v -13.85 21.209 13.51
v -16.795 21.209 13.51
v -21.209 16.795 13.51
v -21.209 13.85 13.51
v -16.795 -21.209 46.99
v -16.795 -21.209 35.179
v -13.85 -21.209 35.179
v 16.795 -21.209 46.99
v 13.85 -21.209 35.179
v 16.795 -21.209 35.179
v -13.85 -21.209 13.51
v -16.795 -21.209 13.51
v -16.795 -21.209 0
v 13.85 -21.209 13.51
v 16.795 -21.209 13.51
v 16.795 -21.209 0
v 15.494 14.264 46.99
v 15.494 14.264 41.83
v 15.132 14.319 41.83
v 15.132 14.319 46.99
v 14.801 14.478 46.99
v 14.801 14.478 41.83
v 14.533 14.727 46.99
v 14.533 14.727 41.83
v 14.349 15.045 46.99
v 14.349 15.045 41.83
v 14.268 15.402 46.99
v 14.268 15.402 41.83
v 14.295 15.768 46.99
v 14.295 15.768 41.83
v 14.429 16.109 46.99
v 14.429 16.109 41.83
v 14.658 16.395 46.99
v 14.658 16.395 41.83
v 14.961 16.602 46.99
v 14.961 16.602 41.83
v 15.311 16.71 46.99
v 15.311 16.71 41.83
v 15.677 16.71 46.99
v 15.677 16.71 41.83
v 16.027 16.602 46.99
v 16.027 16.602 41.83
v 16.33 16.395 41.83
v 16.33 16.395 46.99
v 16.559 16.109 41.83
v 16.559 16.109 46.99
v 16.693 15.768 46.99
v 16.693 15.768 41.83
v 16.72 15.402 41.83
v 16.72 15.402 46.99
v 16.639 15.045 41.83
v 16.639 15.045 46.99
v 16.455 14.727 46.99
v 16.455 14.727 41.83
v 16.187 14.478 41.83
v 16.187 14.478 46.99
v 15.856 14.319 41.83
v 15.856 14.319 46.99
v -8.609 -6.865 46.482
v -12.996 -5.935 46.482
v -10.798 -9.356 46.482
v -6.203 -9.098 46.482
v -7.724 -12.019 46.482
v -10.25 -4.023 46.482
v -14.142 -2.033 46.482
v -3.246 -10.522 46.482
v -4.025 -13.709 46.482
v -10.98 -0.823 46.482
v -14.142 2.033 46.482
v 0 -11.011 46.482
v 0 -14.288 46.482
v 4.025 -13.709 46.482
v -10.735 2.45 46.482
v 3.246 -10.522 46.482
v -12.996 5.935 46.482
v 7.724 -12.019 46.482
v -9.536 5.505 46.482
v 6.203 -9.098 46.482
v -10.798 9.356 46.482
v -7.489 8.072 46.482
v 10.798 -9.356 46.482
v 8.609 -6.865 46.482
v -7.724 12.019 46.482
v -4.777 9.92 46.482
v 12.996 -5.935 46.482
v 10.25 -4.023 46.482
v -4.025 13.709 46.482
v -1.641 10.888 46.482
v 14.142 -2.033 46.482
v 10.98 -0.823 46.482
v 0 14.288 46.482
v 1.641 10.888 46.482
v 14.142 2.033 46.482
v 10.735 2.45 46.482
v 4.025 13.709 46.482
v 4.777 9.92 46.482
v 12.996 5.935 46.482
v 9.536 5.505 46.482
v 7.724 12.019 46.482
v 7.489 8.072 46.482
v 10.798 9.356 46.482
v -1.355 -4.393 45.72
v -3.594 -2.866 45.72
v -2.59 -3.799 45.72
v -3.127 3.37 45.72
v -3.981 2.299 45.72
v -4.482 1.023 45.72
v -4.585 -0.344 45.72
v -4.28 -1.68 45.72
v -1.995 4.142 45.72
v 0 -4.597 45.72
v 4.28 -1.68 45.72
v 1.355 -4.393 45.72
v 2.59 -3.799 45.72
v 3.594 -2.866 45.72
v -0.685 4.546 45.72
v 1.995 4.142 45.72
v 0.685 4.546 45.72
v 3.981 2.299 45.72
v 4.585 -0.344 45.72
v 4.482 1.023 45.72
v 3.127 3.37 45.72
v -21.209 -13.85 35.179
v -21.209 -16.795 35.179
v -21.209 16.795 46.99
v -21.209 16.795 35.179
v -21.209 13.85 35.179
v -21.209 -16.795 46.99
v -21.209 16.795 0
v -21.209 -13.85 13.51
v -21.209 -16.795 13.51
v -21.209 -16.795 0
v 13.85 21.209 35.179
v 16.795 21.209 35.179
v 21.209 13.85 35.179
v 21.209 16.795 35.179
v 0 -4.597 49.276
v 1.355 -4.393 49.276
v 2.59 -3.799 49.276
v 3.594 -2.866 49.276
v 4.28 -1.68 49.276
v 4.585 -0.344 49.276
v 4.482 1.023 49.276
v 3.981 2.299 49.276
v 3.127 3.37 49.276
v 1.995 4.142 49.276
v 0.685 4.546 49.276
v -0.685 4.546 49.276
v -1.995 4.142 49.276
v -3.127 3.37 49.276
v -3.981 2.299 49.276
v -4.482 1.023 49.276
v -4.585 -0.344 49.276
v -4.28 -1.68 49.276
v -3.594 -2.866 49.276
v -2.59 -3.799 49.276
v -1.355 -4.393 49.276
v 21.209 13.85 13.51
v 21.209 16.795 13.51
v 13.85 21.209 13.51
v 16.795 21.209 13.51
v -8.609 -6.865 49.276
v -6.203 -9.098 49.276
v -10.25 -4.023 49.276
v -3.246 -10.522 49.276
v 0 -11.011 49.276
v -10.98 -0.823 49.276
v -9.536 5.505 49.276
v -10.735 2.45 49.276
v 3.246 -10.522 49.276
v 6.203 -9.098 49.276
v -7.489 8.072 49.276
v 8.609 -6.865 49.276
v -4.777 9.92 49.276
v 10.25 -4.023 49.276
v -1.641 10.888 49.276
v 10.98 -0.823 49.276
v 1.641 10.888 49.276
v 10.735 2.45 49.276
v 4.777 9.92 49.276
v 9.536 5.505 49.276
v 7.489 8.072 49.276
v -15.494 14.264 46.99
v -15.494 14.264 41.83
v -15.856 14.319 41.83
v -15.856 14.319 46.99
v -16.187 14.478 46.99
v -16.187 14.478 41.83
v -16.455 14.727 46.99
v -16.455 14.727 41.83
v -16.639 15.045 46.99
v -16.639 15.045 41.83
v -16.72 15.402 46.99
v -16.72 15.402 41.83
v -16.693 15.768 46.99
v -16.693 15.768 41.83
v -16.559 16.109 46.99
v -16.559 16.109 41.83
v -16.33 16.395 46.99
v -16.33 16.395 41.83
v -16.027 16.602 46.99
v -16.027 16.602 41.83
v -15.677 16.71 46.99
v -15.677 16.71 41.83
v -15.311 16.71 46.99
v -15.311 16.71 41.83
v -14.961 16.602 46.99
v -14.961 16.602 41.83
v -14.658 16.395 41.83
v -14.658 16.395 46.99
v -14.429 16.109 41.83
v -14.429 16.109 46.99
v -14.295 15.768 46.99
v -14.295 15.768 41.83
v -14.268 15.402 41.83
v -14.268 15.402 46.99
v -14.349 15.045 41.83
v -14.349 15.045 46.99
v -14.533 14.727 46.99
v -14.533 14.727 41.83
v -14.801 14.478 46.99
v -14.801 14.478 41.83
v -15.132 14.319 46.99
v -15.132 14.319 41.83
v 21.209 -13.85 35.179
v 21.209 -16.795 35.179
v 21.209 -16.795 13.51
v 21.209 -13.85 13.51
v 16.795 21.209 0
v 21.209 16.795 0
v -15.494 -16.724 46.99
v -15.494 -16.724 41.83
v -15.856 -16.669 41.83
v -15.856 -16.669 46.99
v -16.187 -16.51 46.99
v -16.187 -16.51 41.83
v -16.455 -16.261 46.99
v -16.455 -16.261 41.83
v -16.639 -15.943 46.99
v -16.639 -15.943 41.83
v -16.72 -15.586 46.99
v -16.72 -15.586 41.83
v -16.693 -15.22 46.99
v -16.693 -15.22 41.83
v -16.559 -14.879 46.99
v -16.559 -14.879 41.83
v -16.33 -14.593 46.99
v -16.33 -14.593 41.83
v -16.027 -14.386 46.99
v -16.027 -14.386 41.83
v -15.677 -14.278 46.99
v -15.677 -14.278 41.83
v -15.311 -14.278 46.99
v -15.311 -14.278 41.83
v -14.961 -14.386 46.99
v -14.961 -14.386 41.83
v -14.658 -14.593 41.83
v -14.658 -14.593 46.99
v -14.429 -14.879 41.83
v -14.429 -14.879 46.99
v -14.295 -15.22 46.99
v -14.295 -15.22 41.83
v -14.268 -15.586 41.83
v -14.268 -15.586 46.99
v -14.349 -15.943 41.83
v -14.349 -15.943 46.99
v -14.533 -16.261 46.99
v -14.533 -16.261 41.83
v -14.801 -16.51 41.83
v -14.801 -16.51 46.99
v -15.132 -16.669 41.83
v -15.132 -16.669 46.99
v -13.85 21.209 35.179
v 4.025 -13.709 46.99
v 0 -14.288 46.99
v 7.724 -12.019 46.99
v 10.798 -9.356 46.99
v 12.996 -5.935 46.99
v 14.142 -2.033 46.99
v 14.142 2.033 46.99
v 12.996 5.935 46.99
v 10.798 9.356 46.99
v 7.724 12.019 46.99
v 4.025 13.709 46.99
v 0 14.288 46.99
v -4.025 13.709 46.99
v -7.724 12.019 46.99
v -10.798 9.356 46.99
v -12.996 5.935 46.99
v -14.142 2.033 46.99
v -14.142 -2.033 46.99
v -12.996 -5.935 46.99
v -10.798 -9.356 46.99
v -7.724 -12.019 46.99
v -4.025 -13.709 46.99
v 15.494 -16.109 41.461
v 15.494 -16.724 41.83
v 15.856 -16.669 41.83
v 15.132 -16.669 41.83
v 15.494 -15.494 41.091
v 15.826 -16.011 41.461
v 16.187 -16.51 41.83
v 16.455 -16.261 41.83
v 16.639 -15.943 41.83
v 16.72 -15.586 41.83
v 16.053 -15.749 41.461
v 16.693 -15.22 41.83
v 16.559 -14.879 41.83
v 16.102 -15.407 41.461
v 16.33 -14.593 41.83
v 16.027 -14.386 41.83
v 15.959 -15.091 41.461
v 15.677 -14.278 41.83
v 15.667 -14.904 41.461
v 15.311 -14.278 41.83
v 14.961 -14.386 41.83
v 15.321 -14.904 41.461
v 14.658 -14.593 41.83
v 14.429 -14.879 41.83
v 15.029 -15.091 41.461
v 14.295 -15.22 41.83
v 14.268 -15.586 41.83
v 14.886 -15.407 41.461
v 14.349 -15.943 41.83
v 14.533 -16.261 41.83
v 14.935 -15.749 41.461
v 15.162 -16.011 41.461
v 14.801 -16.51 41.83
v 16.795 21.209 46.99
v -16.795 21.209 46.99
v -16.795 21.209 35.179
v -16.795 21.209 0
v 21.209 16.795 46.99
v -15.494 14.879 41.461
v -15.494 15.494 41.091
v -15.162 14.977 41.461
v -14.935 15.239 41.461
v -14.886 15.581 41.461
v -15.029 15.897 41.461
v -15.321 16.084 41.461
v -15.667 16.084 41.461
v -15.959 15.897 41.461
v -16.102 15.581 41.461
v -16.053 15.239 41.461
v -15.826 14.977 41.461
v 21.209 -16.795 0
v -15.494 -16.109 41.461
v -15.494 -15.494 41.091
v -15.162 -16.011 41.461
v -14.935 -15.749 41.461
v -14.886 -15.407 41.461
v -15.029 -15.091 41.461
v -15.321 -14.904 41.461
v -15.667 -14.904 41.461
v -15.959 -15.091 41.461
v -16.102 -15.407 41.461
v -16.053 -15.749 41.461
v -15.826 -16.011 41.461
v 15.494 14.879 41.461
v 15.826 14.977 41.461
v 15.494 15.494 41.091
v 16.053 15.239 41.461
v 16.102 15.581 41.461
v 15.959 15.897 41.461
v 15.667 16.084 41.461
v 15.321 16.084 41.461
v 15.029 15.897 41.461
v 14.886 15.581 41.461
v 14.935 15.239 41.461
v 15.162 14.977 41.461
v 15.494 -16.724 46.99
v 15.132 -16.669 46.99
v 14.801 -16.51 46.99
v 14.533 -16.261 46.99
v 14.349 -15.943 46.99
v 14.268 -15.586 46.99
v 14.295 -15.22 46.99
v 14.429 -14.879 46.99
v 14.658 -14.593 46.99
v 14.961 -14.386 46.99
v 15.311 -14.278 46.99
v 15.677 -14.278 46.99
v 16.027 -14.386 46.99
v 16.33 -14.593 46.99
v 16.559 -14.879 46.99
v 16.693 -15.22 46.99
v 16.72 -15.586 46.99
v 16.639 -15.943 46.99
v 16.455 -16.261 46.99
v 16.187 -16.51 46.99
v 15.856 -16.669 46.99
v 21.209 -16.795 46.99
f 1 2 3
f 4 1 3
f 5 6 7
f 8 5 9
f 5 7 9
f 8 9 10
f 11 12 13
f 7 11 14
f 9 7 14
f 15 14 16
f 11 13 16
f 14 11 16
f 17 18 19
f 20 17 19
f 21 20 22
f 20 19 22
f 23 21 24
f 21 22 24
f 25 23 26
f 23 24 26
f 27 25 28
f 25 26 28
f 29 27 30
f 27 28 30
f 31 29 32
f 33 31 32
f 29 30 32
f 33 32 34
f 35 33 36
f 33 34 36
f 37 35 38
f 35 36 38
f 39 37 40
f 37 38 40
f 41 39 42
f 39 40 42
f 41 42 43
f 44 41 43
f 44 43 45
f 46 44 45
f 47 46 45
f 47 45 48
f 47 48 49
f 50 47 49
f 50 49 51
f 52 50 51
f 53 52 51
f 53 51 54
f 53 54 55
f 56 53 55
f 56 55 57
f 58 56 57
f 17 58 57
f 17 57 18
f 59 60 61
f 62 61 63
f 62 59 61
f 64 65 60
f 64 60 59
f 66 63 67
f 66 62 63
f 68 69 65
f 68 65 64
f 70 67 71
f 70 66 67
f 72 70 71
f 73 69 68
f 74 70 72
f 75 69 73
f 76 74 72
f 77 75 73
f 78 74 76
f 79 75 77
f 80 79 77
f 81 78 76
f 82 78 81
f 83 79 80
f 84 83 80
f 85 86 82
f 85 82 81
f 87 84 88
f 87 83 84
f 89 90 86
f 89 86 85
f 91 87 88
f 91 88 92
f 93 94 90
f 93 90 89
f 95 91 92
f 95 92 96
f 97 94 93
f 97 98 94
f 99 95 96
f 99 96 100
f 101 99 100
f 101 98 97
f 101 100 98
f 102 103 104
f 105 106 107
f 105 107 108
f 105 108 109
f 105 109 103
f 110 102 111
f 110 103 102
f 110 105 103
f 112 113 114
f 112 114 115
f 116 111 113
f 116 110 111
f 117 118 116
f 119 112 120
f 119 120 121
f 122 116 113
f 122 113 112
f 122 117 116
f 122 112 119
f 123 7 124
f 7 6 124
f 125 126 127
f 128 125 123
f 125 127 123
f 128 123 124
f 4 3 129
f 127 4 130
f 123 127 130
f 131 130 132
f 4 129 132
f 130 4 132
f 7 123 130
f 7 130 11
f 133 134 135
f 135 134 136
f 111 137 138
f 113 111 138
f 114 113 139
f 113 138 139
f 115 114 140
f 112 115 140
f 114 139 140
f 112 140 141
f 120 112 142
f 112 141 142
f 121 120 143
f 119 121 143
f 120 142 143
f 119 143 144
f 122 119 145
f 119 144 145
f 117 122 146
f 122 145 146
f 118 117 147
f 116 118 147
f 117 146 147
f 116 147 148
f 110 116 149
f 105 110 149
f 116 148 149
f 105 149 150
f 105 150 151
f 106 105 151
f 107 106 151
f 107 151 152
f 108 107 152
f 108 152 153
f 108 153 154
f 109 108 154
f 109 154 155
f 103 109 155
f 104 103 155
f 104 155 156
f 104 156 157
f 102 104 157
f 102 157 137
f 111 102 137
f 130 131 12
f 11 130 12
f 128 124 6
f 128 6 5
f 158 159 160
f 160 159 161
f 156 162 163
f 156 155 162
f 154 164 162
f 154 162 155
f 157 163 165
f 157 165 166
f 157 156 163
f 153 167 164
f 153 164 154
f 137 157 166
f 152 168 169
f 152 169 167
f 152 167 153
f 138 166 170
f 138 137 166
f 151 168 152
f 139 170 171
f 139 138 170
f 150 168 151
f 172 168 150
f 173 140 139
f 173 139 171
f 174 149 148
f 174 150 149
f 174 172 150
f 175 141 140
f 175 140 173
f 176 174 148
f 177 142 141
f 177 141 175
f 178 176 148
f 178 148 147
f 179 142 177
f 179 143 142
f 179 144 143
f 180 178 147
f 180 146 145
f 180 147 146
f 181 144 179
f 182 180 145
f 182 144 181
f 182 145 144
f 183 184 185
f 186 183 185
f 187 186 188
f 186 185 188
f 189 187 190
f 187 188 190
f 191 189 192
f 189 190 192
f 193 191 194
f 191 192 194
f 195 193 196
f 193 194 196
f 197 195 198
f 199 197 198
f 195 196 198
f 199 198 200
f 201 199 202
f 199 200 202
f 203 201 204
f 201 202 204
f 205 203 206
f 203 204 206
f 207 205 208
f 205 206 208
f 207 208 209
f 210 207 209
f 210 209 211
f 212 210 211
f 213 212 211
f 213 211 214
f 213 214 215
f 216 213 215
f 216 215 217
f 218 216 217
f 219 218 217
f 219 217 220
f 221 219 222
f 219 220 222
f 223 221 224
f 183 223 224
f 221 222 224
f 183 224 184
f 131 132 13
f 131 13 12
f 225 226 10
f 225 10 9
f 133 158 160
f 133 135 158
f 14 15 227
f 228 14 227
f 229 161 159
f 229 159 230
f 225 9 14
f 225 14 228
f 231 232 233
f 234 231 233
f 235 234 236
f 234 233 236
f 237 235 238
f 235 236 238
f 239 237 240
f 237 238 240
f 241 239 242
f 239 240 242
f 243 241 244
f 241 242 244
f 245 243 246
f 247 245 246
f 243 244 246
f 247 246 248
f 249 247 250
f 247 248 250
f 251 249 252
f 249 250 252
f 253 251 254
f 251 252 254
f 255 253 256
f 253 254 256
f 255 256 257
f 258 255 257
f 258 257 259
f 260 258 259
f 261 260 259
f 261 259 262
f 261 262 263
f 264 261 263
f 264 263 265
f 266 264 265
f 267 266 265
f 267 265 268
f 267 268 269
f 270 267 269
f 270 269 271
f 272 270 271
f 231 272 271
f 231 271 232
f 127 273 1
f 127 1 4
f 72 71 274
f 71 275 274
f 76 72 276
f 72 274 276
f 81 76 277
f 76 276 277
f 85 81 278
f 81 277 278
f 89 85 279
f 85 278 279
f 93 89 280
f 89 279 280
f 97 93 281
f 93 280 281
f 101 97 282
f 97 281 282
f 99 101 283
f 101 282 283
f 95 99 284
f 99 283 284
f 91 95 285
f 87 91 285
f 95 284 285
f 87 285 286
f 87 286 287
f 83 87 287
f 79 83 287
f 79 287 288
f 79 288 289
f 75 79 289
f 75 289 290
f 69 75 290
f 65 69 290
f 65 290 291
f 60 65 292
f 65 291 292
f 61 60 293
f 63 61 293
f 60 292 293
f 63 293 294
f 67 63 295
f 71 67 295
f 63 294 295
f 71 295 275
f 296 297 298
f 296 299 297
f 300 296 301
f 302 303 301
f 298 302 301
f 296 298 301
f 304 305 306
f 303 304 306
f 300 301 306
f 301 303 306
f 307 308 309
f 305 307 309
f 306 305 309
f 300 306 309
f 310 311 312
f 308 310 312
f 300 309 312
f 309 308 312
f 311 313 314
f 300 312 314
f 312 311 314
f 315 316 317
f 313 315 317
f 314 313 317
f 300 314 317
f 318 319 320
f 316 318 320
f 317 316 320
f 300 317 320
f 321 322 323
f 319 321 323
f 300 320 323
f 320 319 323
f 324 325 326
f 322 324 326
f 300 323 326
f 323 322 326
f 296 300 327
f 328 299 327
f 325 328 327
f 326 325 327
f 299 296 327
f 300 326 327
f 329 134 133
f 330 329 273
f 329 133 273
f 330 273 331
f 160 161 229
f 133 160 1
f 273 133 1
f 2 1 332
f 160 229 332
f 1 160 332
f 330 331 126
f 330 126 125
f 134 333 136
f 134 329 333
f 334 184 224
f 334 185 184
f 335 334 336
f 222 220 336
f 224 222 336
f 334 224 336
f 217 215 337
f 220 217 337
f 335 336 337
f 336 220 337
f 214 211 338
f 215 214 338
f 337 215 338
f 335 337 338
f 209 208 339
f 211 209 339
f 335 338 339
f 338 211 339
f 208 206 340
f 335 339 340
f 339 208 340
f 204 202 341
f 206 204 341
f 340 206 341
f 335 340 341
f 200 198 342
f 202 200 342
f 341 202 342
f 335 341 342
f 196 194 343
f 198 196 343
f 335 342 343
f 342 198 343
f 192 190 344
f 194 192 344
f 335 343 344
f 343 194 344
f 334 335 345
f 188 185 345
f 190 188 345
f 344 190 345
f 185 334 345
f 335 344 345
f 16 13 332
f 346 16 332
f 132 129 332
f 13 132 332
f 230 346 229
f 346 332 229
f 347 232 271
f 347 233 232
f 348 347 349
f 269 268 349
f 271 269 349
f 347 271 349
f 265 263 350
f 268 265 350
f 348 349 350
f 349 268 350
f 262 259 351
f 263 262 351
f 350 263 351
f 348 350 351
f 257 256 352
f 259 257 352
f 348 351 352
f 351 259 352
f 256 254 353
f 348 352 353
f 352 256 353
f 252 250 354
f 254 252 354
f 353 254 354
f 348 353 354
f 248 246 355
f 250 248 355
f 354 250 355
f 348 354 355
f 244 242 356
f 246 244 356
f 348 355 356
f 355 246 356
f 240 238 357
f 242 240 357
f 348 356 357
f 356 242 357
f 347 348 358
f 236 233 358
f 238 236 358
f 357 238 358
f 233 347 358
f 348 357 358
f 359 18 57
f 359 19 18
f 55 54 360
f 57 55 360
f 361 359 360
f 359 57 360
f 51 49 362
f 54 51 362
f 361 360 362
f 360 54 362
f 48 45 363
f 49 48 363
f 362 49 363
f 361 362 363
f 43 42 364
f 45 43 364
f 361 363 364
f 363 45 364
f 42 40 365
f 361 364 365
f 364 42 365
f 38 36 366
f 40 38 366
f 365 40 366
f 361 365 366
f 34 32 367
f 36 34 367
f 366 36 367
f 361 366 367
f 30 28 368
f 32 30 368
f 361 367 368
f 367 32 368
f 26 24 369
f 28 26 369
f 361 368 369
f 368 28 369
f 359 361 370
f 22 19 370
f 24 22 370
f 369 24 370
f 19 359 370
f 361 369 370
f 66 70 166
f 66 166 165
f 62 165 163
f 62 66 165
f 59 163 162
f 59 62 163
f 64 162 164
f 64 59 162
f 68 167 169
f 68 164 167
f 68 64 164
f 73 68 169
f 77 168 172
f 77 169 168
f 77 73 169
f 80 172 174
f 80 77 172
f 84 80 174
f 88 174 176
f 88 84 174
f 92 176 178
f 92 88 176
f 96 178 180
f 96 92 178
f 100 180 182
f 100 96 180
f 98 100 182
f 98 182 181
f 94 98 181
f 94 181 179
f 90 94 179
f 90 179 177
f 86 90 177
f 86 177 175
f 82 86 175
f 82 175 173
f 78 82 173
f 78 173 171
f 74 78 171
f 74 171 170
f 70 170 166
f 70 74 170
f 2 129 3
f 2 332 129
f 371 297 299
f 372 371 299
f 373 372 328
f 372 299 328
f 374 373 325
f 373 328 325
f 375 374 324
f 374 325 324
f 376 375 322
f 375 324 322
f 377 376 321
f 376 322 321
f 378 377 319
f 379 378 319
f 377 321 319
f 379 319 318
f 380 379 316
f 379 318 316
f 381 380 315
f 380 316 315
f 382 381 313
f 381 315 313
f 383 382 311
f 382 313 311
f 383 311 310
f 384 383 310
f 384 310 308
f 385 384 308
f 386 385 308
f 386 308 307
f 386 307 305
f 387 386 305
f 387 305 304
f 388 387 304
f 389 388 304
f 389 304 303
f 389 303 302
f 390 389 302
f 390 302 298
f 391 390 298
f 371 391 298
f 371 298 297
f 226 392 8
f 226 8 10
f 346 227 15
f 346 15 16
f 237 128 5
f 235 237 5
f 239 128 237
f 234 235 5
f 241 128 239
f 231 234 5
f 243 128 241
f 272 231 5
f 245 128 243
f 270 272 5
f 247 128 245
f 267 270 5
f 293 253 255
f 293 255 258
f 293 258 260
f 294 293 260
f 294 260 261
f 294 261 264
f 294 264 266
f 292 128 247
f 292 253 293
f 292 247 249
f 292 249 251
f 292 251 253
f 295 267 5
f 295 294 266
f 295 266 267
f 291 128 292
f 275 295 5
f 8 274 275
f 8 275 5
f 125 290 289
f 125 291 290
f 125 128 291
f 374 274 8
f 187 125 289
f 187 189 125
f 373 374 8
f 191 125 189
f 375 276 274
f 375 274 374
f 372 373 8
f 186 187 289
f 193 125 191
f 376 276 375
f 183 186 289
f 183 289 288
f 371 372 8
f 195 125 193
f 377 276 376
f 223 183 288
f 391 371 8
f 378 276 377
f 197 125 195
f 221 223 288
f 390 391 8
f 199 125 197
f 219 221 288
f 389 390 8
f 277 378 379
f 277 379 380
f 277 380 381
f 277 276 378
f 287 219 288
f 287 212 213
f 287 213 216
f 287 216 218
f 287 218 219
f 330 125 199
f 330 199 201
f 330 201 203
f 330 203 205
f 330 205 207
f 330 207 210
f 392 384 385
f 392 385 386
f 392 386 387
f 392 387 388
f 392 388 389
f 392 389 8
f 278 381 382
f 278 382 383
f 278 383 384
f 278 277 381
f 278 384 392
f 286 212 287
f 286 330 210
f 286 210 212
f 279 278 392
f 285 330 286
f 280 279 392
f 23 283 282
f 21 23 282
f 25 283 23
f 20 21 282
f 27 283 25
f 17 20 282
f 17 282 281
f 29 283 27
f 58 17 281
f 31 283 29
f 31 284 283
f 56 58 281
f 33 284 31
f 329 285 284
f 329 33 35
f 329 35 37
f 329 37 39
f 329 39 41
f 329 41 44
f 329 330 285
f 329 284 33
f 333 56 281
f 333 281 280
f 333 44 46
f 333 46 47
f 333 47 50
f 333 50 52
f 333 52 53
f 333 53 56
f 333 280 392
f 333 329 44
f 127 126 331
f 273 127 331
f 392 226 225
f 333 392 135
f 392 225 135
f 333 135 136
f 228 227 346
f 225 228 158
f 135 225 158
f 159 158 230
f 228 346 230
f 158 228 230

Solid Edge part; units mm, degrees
sketch "Sketch1" plane through (0, 0, 0) normal (0, 0, 1) x (1, 0, 0)
  line L0 (-21.209, -21.209) -> (21.209, -21.209)
  line L1 (21.209, -21.209) -> (21.209, 21.209)
  line L2 (21.209, 21.209) -> (-21.209, 21.209)
  line L3 (-21.209, 21.209) -> (-21.209, -21.209)
  dimension "D1" = 42.418
  dimension "D2" = 42.418
extrude "Protrusion1" add sketch "Sketch1" along normal blind 46.99
hole "Hole_1" at (-15.494, -15.494, 46.99) direction (0, 0, -1) diameter 2.459 depth 5.16 tip angle 118
hole "Hole1" at (15.494, -15.494, 46.99) direction (0, 0, -1) diameter 2.459 depth 5.16 tip angle 118
hole "Hole2" at (15.494, 15.494, 46.99) direction (0, 0, -1) diameter 2.459 depth 5.16 tip angle 118
hole "Hole3" at (-15.494, 15.494, 46.99) direction (0, 0, -1) diameter 2.459 depth 5.16 tip angle 118
sketch "Sketch2" plane through (0, 0, 46.99) normal (0, 0, 1) x (0, -1, 0)
  circle A0 centre (0, 0) radius 14.2875
extrude "CircleIndent" cut sketch "Sketch2" against normal blind 0.508
sketch "Sketch3" plane through (0, 0, 46.482) normal (0, 0, 1) x (0, -1, 0)
  circle A0 centre (0, 0) radius 11.0109
extrude "CenteringCircle" add sketch "Sketch3" along normal blind 2.794
sketch "Sketch4" plane through (0, 0, 49.276) normal (0, 0, 1) x (0, -1, 0)
  circle A0 centre (0, 0) radius 4.5974
extrude "ShaftHole" cut sketch "Sketch4" against normal blind 3.556
chamfer "SideChamfer" distance 4.4136 angle 45 4 edges at (21.209, -21.209, 23.495) (-21.209, -21.209, 23.495) (21.209, 21.209, 23.495) (-21.209, 21.209, 23.495)
sketch "Sketch5" plane through (19.0022, -19.0022, 23.495) normal (0.7071, -0.7071, 0) x (0, 0, -1)
  line L0 (-11.684, -13.6206) -> (9.9845, -13.6206)
  line L1 (9.9845, -13.6206) -> (9.9845, 11.7794)
  line L2 (9.9845, 11.7794) -> (-11.684, 11.7794)
  line L3 (-11.684, 11.7794) -> (-11.684, -13.6206)
  dimension "D1" = 11.811
extrude "SideCutout" cut sketch "Sketch5" against normal blind 2.0828
mirror "Mirror1" about plane through (0, 0, 0) normal (1, 0, 0) of "SideCutout"
mirror "Mirror2" about plane through (0, 0, 0) normal (0, -1, 0) of "SideCutout", "Mirror1"
properties material "Steel"
